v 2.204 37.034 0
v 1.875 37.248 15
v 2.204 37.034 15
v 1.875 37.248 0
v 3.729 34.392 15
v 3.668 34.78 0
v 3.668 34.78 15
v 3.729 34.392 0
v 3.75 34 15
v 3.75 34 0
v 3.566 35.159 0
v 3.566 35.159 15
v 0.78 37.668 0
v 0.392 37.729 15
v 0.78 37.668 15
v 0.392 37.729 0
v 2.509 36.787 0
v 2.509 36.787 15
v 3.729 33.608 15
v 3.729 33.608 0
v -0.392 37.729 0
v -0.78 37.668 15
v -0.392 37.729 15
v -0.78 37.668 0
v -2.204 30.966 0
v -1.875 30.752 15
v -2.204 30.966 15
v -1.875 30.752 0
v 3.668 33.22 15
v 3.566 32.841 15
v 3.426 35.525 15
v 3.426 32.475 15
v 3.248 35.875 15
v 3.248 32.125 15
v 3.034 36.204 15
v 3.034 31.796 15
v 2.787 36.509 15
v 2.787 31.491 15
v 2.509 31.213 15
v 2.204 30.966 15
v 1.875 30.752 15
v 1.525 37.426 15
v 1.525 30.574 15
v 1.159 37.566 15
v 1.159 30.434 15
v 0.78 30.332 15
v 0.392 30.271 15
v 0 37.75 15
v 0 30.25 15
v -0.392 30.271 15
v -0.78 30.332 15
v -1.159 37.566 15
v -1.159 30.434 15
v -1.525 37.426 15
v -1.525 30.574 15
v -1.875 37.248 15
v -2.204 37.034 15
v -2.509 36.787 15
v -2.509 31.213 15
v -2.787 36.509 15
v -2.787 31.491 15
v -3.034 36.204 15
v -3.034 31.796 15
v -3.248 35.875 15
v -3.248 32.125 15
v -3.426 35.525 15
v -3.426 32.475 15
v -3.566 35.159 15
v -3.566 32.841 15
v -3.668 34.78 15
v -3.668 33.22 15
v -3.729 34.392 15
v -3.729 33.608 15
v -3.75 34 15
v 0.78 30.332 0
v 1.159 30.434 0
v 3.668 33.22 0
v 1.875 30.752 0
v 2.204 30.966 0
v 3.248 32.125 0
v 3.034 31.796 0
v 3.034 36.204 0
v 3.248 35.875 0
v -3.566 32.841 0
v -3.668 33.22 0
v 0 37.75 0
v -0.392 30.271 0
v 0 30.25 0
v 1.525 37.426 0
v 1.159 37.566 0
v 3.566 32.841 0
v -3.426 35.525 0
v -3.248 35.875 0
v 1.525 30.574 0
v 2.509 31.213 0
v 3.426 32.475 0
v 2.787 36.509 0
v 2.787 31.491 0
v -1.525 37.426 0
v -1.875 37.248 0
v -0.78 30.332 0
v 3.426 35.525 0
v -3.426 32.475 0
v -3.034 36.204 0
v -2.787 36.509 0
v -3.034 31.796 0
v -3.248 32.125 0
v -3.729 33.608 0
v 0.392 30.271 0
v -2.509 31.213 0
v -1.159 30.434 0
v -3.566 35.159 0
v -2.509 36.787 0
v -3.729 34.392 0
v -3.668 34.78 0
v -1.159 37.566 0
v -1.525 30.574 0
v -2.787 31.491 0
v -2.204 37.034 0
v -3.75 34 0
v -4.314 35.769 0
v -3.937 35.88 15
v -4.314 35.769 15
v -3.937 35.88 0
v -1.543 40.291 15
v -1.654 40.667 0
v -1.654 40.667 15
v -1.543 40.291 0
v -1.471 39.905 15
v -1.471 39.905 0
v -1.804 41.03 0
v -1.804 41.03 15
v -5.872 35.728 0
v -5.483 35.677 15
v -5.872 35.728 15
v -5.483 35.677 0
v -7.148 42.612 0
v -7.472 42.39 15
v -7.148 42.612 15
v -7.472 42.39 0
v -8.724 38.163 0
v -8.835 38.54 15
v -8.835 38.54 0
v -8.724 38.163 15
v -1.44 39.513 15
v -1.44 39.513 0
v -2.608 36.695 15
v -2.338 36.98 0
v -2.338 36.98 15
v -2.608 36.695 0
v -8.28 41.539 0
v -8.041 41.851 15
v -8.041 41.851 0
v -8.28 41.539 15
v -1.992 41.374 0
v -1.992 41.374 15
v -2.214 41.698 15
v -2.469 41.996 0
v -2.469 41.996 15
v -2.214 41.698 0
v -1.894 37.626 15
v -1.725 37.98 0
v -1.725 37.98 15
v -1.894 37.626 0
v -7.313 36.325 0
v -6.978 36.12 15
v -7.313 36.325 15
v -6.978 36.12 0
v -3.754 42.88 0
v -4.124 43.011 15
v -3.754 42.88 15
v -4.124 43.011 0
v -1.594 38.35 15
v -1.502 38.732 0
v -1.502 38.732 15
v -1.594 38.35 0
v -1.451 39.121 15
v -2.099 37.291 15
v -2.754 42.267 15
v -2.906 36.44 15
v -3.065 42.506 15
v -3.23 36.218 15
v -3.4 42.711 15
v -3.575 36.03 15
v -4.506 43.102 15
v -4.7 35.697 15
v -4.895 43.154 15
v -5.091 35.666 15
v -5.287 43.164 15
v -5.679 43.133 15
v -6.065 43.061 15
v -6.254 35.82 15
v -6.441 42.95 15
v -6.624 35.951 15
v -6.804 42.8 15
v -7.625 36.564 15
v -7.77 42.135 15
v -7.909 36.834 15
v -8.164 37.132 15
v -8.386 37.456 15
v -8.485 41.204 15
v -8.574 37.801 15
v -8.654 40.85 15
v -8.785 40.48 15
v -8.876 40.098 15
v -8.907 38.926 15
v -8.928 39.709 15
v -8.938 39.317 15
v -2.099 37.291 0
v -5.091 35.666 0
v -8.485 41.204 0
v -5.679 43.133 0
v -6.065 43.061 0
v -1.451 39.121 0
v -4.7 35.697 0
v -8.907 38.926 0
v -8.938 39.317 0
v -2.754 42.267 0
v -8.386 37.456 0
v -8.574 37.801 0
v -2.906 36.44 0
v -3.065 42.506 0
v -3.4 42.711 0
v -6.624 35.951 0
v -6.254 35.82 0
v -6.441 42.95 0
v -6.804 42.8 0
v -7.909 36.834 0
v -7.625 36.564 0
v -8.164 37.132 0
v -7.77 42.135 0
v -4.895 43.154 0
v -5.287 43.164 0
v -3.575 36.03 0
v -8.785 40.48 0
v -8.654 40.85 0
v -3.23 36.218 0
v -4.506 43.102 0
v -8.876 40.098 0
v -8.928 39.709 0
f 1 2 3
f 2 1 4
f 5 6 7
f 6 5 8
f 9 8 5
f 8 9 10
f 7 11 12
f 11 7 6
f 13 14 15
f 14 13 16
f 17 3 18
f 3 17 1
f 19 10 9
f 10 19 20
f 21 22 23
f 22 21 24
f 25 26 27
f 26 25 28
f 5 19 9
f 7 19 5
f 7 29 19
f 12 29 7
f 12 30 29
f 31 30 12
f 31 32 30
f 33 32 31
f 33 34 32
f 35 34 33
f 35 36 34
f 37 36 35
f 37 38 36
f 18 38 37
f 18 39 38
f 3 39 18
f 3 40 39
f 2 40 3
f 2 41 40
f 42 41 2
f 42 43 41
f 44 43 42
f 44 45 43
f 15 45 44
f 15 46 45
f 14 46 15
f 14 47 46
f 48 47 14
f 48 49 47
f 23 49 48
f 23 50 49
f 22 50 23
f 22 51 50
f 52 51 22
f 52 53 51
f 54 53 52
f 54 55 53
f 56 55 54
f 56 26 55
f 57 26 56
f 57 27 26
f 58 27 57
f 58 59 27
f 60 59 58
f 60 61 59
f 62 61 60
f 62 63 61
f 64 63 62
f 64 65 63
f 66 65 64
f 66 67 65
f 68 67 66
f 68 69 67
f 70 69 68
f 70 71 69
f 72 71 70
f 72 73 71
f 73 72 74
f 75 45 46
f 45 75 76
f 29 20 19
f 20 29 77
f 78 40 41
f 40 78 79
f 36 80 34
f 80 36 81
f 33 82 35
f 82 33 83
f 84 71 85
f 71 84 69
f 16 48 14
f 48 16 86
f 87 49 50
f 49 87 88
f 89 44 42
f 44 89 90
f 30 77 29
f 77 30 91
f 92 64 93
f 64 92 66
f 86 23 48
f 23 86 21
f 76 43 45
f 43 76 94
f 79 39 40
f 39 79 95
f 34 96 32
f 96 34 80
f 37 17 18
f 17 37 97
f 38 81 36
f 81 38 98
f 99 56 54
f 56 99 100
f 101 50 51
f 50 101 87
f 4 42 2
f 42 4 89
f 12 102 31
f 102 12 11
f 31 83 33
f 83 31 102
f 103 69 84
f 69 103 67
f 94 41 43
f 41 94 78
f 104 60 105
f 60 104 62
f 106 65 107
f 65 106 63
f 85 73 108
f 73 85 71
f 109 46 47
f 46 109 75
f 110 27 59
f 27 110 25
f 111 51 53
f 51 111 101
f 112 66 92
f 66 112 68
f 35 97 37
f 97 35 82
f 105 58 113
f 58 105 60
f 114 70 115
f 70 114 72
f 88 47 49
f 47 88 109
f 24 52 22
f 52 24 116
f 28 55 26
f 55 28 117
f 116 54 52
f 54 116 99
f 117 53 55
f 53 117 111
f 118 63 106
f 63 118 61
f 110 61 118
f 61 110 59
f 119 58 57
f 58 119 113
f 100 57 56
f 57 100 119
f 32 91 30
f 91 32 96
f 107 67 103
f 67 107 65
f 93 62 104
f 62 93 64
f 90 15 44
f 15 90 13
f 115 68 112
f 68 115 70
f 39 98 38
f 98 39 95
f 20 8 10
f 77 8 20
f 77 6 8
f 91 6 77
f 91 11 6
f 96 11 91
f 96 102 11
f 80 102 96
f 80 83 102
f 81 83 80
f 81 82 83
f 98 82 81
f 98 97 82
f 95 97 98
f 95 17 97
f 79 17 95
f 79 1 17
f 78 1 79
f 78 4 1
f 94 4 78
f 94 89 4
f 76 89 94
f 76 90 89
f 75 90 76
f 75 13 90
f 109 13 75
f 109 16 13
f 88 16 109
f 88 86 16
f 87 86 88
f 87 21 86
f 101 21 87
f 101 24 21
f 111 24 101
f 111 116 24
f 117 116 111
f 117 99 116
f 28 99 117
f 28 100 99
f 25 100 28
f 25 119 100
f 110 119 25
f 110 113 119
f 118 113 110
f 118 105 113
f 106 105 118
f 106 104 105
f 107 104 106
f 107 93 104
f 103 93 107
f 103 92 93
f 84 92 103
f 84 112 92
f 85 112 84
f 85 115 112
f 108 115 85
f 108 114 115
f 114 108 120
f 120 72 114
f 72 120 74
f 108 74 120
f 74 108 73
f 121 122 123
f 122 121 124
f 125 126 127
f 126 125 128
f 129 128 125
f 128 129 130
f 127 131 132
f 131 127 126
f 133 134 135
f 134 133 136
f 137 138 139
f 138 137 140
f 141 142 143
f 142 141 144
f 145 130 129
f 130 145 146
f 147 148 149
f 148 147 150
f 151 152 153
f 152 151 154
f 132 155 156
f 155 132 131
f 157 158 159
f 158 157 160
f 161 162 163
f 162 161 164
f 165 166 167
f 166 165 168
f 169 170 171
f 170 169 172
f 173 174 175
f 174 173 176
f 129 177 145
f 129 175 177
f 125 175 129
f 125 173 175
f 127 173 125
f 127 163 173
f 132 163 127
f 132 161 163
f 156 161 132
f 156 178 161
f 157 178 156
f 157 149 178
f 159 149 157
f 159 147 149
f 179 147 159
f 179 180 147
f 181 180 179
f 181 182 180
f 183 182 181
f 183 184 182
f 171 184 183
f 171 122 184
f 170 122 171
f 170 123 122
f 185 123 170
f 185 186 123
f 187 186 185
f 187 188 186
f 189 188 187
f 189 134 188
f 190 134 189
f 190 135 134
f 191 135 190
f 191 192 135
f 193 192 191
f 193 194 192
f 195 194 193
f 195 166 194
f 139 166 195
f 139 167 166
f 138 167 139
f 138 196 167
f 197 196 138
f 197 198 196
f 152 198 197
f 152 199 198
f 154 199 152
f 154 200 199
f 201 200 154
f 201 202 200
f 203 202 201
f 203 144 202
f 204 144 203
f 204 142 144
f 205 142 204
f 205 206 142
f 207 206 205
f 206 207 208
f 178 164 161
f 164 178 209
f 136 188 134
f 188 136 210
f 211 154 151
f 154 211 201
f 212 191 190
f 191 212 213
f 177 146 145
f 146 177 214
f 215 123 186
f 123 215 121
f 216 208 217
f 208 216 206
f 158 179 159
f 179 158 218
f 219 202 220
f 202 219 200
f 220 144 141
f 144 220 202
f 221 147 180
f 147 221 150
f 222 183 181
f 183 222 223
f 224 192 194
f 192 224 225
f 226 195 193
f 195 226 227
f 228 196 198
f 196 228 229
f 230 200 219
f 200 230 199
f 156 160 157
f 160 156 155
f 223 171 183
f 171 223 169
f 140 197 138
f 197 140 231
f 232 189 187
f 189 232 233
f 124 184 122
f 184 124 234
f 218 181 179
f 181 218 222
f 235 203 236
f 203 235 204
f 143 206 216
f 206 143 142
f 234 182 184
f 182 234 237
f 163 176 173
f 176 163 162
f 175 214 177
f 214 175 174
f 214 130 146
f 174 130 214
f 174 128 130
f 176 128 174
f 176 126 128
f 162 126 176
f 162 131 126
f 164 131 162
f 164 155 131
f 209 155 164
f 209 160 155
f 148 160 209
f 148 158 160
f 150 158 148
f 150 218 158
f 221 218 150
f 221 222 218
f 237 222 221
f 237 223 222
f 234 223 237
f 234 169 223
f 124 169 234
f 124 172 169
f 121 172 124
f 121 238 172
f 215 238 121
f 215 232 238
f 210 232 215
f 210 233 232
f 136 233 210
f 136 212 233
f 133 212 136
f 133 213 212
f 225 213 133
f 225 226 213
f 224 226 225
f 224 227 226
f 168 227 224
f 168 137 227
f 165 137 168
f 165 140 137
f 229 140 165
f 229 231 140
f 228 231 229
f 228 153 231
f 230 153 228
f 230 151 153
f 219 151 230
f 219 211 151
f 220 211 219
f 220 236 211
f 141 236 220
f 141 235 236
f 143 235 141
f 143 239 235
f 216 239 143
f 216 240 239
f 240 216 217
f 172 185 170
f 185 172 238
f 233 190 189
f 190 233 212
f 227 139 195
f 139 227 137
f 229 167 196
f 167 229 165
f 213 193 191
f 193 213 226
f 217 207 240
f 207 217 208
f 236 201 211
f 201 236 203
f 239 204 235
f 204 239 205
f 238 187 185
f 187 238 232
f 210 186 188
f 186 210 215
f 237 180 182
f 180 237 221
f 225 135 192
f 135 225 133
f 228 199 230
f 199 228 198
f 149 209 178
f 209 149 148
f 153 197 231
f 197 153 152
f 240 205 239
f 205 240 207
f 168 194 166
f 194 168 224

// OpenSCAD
$fn = 60;

numberDivs = 24; //around a 360 circle
innerBandRad = 30; //radius of whole band
height = 15.0; //height of band
wallThickness = 0.5;
outerRad = 4.0; //radius of small circles

innerRad = outerRad-wallThickness;
ang_A = (360/numberDivs)/2; //angle between inner and outer cirs

circSeparation = (outerRad*2)-wallThickness;
centerLineRad = (outerRad+innerRad)/2; //centerline of circles
innerCirCenter = innerBandRad+outerRad; //=>34

//trig -----------------
a1 = cos(ang_A)*innerCirCenter;//inner portion of outerCirCenter
echo("a1: ", a1);
c1 = sin(ang_A)*innerCirCenter;//dist between 1st and 2nd arcs
//echo("c1: ", c1);
//pythagorean:
a2 = sqrt(pow(circSeparation, 2) - pow(c1, 2)); //outer portion of outerCirCenter
//a2 = sqrt(a22);
echo("a2: ", a2);
outerCirCenter = a1+a2;
//echo("outerCirCenter: ", outerCirCenter);g_2

ang_Ai = atan2(c1, a1); //same as 'ang_A'
echo("ang_Ai: ", ang_Ai);

ang_B = atan2(c1, a2);
echo("ang_B: ", ang_B);

ang_Bx = 180-ang_B;
echo("ang_Bx: ", ang_Bx);

ang_Bpie = ang_Bx*2;
echo("ang_Bpie: ", ang_Bpie);

ang_C1 = 90-ang_B;
echo("ang_C1: ", ang_C1);

ang_C2 = 180-(ang_A + ang_B + ang_C1);
echo("ang_C2: ", ang_C2);

ang_Cx = ang_C1 + ang_C2;
echo("ang_Cx: ", ang_Cx);

ang_Cpie = ang_Cx*2;
echo("ang_Cpie: ", ang_Cpie);

angX = ang_Bx-ang_Cx;
echo("angX: ", angX);

//----------------------

module baseCir() {
	cylinder(r=centerLineRad, h=height);
}

//baseCir();

module twoCircs() {
	translate ([0, innerCirCenter, 0]) baseCir();
	rotate(a=ang_A) translate ([0, outerCirCenter, 0]) baseCir();
}

twoCircs();









//---------------------------------------
// 3/4 cylinder
module c1() {
	difference() {
		cylinder(r=outerRad, h=height);
		union() { 
			cylinder(r=innerRad, h=height);
			cube(size=[outerRad, outerRad, height]); 
		}
	}
}

//2nd circle 
module c2() {
	translate([outerRad+innerRad, 0, 0]) rotate(a=180) c1();
}

module oneLink_old() {
	union() {
		c1();
		c2();
	}
}
//oneLink();
